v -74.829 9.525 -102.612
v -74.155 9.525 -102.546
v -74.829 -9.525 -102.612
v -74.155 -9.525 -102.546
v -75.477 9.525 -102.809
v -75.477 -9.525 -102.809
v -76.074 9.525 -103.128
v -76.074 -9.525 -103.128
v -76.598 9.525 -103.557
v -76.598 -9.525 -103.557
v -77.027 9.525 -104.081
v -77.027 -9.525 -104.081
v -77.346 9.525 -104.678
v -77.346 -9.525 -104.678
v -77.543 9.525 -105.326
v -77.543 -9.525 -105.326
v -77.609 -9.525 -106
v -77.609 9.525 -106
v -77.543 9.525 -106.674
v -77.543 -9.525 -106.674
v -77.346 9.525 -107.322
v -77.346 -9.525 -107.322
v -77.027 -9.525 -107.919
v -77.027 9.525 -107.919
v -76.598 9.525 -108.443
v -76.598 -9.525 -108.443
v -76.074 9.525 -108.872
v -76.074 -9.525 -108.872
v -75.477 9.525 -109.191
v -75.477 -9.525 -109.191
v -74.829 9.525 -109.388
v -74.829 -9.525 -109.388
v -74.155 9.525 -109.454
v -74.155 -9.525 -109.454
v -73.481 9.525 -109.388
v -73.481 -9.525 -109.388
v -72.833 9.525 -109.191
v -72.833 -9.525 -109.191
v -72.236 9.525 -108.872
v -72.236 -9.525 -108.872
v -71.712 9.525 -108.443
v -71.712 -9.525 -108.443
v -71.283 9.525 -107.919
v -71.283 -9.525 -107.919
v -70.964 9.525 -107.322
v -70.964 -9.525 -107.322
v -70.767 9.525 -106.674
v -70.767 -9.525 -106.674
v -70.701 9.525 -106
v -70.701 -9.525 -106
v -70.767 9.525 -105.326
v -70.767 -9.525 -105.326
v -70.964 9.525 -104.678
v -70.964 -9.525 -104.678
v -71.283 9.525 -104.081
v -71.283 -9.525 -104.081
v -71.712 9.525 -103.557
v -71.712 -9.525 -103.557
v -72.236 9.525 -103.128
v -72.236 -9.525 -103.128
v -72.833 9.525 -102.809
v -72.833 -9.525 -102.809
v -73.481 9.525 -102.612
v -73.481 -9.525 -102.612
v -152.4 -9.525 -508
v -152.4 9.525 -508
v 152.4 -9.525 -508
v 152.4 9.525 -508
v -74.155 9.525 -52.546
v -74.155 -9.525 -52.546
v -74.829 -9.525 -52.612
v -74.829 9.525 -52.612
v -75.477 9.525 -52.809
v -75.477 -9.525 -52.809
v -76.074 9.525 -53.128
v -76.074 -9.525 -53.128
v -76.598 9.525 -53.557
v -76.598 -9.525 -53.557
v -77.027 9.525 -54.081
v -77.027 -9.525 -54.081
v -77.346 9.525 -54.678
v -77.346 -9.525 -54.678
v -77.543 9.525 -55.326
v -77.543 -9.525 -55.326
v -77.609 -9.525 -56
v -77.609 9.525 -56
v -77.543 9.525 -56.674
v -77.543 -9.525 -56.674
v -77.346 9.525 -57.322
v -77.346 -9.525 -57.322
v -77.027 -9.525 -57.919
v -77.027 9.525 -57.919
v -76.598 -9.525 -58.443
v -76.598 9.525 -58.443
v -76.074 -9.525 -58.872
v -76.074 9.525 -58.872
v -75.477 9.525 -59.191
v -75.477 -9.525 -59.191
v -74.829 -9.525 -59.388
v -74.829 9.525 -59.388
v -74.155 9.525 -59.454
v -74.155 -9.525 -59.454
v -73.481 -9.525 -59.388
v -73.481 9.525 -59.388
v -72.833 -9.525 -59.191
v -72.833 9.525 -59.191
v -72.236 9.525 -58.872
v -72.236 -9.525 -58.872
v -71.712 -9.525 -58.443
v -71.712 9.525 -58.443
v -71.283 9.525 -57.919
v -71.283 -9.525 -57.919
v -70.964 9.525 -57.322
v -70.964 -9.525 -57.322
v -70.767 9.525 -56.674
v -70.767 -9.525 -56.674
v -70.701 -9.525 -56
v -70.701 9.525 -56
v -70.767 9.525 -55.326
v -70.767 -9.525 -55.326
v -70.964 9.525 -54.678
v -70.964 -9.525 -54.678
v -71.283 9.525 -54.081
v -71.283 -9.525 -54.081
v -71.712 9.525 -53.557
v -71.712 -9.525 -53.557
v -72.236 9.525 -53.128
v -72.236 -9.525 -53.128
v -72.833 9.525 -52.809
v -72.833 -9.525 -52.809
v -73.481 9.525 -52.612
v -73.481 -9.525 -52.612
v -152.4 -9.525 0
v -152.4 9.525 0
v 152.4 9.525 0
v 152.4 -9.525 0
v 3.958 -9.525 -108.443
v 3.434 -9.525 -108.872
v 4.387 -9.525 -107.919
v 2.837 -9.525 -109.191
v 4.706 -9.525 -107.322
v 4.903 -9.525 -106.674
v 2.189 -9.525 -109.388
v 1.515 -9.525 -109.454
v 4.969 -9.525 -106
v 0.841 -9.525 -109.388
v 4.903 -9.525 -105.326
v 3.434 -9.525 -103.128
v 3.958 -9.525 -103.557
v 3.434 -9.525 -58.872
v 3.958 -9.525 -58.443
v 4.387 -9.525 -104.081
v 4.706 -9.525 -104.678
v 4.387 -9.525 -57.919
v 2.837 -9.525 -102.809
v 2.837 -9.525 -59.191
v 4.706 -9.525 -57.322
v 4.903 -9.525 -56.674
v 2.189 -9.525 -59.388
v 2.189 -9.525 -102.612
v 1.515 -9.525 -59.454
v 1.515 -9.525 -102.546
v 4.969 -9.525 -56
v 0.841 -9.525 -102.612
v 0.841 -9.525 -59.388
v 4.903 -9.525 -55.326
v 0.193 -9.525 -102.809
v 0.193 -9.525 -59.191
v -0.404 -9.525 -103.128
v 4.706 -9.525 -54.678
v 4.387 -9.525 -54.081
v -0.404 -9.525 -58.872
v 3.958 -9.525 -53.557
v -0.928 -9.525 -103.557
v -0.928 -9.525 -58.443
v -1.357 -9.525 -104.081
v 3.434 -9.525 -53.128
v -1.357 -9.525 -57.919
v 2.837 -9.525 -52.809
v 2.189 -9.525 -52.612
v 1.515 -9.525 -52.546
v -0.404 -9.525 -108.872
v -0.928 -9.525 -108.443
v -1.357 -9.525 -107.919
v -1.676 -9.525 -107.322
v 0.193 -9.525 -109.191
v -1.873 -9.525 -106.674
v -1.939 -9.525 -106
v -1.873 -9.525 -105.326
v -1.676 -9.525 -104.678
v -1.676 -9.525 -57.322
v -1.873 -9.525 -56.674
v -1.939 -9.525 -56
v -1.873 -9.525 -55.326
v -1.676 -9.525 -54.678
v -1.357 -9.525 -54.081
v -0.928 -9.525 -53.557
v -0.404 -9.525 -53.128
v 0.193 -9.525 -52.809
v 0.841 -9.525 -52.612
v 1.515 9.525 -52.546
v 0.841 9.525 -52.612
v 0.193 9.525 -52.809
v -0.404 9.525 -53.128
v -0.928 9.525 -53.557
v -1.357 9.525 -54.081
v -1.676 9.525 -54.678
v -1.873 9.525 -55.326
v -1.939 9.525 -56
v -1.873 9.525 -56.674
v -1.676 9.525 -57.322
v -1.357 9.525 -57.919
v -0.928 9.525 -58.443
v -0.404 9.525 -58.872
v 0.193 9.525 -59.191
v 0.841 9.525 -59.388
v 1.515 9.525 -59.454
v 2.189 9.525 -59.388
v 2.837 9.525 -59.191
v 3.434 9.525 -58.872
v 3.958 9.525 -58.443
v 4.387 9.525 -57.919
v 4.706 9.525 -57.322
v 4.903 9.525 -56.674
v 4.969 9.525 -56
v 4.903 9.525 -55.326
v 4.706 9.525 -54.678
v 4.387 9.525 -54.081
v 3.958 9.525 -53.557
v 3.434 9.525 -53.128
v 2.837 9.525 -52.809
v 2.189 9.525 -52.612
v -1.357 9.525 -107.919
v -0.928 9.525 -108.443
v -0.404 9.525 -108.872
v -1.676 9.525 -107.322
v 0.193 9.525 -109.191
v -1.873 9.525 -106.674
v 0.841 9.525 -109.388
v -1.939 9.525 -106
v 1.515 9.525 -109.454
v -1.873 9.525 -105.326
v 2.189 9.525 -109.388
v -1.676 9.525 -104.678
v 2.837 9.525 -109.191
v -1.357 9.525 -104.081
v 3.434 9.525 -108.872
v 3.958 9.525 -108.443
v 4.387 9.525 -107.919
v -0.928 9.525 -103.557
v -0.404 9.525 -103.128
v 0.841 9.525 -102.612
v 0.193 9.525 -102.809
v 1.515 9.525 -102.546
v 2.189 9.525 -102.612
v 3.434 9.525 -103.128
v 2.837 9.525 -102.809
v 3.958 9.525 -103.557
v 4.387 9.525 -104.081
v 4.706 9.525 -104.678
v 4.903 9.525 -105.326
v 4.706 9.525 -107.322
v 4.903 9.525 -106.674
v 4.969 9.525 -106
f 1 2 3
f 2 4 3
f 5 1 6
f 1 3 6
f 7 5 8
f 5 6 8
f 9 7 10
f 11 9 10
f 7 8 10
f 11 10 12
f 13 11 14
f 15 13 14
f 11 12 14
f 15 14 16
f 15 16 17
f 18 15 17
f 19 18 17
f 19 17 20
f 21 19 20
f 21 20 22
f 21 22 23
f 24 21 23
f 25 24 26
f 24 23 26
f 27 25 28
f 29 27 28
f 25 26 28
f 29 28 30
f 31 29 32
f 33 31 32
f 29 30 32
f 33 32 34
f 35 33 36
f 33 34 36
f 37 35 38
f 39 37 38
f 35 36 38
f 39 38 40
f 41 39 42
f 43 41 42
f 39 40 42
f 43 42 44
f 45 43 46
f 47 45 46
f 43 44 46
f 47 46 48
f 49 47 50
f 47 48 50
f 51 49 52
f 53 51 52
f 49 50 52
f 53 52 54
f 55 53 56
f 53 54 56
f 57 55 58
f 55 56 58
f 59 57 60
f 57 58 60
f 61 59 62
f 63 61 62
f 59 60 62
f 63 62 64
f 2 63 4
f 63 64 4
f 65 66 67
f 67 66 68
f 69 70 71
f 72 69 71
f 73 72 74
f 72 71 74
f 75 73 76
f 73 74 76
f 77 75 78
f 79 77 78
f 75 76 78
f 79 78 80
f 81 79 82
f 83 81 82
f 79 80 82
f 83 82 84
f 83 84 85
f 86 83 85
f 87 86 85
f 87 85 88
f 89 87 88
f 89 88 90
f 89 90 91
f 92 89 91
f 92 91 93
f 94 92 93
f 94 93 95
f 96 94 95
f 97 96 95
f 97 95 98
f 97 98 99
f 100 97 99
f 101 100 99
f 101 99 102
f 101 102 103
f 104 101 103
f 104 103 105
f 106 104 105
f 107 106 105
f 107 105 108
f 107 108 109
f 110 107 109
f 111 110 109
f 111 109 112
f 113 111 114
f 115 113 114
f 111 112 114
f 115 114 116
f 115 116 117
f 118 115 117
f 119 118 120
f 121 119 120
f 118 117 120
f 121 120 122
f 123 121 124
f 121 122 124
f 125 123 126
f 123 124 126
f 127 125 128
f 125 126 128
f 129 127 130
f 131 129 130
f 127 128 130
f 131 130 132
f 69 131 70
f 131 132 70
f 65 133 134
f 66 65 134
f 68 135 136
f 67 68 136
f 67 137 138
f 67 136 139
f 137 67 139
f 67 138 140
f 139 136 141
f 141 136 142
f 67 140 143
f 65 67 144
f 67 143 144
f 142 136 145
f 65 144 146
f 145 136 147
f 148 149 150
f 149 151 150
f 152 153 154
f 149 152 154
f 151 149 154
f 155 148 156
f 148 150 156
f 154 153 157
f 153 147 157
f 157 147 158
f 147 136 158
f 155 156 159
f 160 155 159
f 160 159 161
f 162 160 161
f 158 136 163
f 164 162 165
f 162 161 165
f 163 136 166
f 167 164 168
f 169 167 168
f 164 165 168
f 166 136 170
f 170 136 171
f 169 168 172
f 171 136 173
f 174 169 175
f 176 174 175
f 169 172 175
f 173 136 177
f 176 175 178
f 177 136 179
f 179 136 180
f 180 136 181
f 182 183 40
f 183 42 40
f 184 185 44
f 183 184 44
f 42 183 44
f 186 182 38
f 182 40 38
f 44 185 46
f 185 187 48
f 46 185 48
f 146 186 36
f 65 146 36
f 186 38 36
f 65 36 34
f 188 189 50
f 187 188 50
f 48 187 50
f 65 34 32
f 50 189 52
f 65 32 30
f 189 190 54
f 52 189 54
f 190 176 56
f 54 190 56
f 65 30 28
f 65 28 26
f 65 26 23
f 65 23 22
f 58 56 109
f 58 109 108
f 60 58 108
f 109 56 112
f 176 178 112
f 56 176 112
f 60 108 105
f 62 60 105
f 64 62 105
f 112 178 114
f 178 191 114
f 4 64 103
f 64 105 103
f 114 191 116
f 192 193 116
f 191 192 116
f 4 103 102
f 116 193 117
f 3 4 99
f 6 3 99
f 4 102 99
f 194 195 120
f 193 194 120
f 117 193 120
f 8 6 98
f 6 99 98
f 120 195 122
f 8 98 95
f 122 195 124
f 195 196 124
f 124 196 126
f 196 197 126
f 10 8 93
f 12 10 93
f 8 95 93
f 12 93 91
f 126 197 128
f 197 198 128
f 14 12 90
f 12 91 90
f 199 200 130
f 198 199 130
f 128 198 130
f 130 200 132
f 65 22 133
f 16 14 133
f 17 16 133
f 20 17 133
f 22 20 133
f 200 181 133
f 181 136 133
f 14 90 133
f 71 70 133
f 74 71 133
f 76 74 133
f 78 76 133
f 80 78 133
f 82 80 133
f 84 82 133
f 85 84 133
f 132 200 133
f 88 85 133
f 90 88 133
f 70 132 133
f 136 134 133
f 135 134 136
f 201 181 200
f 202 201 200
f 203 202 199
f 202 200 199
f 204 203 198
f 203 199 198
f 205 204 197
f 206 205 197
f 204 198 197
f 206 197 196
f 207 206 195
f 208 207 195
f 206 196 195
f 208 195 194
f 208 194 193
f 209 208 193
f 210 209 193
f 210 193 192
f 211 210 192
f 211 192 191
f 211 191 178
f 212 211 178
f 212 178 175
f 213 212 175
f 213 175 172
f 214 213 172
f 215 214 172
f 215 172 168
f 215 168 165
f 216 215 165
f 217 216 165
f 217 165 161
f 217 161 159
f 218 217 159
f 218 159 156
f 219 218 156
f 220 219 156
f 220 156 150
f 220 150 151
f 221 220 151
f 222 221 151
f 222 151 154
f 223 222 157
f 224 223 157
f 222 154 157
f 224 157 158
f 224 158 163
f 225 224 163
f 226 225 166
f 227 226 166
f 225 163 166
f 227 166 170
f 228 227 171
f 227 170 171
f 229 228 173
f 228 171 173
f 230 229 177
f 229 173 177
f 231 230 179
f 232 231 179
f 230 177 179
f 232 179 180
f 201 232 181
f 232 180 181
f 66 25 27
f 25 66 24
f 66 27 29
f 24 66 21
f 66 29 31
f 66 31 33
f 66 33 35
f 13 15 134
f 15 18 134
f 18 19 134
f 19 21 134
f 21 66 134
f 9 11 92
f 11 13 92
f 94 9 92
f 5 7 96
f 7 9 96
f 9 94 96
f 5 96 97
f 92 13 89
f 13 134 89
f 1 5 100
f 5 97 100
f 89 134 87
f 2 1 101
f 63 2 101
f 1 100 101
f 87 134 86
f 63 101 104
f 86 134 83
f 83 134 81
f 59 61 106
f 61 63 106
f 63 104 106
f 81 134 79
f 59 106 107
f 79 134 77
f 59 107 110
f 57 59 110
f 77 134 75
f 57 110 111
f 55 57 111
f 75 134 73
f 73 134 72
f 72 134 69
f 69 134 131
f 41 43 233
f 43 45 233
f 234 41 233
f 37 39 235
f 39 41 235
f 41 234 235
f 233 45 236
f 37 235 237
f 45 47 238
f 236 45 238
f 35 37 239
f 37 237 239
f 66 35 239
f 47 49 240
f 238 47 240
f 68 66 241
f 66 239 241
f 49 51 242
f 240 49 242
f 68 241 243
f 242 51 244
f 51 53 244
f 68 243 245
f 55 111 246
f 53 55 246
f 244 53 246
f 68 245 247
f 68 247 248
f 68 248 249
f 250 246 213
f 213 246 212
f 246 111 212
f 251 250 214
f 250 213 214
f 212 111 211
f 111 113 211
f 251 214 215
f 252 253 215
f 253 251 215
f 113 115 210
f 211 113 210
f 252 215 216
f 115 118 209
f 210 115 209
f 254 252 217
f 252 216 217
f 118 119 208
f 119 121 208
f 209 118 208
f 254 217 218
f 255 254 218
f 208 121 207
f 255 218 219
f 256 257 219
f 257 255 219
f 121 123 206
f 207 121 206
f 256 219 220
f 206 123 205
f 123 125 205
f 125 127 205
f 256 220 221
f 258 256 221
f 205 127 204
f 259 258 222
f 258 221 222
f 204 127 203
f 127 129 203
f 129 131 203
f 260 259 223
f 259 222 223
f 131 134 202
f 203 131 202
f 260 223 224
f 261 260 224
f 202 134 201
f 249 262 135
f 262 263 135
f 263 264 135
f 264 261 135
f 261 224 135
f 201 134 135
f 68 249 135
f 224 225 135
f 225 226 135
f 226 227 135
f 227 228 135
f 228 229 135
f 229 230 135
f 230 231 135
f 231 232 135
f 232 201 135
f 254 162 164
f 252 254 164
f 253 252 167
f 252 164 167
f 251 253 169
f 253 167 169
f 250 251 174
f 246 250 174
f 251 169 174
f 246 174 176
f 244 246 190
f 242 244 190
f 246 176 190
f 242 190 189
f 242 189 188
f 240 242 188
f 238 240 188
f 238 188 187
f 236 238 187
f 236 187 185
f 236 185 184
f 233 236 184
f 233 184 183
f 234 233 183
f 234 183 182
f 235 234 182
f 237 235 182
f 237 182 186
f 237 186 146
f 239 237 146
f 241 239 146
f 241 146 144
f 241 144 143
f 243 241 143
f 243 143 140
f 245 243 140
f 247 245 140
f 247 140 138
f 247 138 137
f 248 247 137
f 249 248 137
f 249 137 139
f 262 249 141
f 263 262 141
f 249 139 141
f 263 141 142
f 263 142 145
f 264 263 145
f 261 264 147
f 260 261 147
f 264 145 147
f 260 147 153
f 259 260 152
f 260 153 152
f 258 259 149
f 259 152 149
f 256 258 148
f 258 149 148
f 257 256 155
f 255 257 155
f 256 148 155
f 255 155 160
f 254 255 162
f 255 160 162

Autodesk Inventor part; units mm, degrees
ref_plane "YZ Plane" through (0, 0, 0) normal (1, 0, 0) x (0, 1, 0)
ref_plane "XZ Plane" through (0, 0, 0) normal (0, 1, 0) x (-1, 0, 0)
ref_plane "XY Plane" through (0, 0, 0) normal (0, 0, 1) x (1, 0, 0)
sketch "Sketch1" plane through (0, 0, 0) normal (0, 0, 1) x (1, 0, 0)
  line L0 (-152.4, 9.525) -> (152.4, 9.525)
  line L1 (152.4, 9.525) -> (152.4, -9.525)
  line L2 (152.4, -9.525) -> (-152.4, -9.525)
  line L3 (-152.4, -9.525) -> (-152.4, 9.525)
  line L4 (-152.4, 9.525) -> (152.4, -9.525) construction
  line L5 (152.4, 9.525) -> (-152.4, -9.525) construction
  point P0 (0, 0)
  dimension "d0" = 304.8
  dimension "d1" = 19.05
extrude "Extrusion1" add sketch "Sketch1" against normal blind 508
sketch "Sketch2" plane through (-152.4, 9.525, 0) normal (0, 1, 0) x (1, 0, 0)
  line L0 (0, 0) -> (0, 508) projected
  line L1 (0, 0) -> (304.8, 0) projected
  point P0 (152.4, 0)
  point P1 (78.245, 56)
  dimension "d4" = 78.245
  dimension "d5" = 56
hole "Hole1" at (-74.155, 9.525, -56) direction (0, -1, 0) diameter 6.9088 end through all
pattern_linear "Rectangular Pattern1" count 2 spacing 50 along (0, 0, -1) count 2 spacing 75.67 along (1, 0, 0) of "Hole1"
equation "\"d0\" = mp_wid"
equation "\"d1\" = mp_thick"
equation "\"d2\" = mp_len"
equation "\"d4\" = mp_mbra_holes_w_offset"
equation "\"d5\" = mp_mbra_holes_l_offset"
equation "\"d15\" = mp_mbra_holes_l_spacing"
equation "\"d18\" = mp_mbra_holes_w_spacing"
equation "\"mp_wid\" = 304.8"
equation "\"mp_thick\" = 19.05"
equation "\"mp_len\" = 508"
equation "\"mp_mbra_holes_l_spacing\" = 50"
equation "\"mp_mbra_holes_w_spacing\" = 75.67"
equation "\"mp_mbra_holes_w_offset\" = 78.245"
equation "\"mp_mbra_holes_l_offset\" = 56"
properties part number "mplate02" material "Aluminum 6061"
